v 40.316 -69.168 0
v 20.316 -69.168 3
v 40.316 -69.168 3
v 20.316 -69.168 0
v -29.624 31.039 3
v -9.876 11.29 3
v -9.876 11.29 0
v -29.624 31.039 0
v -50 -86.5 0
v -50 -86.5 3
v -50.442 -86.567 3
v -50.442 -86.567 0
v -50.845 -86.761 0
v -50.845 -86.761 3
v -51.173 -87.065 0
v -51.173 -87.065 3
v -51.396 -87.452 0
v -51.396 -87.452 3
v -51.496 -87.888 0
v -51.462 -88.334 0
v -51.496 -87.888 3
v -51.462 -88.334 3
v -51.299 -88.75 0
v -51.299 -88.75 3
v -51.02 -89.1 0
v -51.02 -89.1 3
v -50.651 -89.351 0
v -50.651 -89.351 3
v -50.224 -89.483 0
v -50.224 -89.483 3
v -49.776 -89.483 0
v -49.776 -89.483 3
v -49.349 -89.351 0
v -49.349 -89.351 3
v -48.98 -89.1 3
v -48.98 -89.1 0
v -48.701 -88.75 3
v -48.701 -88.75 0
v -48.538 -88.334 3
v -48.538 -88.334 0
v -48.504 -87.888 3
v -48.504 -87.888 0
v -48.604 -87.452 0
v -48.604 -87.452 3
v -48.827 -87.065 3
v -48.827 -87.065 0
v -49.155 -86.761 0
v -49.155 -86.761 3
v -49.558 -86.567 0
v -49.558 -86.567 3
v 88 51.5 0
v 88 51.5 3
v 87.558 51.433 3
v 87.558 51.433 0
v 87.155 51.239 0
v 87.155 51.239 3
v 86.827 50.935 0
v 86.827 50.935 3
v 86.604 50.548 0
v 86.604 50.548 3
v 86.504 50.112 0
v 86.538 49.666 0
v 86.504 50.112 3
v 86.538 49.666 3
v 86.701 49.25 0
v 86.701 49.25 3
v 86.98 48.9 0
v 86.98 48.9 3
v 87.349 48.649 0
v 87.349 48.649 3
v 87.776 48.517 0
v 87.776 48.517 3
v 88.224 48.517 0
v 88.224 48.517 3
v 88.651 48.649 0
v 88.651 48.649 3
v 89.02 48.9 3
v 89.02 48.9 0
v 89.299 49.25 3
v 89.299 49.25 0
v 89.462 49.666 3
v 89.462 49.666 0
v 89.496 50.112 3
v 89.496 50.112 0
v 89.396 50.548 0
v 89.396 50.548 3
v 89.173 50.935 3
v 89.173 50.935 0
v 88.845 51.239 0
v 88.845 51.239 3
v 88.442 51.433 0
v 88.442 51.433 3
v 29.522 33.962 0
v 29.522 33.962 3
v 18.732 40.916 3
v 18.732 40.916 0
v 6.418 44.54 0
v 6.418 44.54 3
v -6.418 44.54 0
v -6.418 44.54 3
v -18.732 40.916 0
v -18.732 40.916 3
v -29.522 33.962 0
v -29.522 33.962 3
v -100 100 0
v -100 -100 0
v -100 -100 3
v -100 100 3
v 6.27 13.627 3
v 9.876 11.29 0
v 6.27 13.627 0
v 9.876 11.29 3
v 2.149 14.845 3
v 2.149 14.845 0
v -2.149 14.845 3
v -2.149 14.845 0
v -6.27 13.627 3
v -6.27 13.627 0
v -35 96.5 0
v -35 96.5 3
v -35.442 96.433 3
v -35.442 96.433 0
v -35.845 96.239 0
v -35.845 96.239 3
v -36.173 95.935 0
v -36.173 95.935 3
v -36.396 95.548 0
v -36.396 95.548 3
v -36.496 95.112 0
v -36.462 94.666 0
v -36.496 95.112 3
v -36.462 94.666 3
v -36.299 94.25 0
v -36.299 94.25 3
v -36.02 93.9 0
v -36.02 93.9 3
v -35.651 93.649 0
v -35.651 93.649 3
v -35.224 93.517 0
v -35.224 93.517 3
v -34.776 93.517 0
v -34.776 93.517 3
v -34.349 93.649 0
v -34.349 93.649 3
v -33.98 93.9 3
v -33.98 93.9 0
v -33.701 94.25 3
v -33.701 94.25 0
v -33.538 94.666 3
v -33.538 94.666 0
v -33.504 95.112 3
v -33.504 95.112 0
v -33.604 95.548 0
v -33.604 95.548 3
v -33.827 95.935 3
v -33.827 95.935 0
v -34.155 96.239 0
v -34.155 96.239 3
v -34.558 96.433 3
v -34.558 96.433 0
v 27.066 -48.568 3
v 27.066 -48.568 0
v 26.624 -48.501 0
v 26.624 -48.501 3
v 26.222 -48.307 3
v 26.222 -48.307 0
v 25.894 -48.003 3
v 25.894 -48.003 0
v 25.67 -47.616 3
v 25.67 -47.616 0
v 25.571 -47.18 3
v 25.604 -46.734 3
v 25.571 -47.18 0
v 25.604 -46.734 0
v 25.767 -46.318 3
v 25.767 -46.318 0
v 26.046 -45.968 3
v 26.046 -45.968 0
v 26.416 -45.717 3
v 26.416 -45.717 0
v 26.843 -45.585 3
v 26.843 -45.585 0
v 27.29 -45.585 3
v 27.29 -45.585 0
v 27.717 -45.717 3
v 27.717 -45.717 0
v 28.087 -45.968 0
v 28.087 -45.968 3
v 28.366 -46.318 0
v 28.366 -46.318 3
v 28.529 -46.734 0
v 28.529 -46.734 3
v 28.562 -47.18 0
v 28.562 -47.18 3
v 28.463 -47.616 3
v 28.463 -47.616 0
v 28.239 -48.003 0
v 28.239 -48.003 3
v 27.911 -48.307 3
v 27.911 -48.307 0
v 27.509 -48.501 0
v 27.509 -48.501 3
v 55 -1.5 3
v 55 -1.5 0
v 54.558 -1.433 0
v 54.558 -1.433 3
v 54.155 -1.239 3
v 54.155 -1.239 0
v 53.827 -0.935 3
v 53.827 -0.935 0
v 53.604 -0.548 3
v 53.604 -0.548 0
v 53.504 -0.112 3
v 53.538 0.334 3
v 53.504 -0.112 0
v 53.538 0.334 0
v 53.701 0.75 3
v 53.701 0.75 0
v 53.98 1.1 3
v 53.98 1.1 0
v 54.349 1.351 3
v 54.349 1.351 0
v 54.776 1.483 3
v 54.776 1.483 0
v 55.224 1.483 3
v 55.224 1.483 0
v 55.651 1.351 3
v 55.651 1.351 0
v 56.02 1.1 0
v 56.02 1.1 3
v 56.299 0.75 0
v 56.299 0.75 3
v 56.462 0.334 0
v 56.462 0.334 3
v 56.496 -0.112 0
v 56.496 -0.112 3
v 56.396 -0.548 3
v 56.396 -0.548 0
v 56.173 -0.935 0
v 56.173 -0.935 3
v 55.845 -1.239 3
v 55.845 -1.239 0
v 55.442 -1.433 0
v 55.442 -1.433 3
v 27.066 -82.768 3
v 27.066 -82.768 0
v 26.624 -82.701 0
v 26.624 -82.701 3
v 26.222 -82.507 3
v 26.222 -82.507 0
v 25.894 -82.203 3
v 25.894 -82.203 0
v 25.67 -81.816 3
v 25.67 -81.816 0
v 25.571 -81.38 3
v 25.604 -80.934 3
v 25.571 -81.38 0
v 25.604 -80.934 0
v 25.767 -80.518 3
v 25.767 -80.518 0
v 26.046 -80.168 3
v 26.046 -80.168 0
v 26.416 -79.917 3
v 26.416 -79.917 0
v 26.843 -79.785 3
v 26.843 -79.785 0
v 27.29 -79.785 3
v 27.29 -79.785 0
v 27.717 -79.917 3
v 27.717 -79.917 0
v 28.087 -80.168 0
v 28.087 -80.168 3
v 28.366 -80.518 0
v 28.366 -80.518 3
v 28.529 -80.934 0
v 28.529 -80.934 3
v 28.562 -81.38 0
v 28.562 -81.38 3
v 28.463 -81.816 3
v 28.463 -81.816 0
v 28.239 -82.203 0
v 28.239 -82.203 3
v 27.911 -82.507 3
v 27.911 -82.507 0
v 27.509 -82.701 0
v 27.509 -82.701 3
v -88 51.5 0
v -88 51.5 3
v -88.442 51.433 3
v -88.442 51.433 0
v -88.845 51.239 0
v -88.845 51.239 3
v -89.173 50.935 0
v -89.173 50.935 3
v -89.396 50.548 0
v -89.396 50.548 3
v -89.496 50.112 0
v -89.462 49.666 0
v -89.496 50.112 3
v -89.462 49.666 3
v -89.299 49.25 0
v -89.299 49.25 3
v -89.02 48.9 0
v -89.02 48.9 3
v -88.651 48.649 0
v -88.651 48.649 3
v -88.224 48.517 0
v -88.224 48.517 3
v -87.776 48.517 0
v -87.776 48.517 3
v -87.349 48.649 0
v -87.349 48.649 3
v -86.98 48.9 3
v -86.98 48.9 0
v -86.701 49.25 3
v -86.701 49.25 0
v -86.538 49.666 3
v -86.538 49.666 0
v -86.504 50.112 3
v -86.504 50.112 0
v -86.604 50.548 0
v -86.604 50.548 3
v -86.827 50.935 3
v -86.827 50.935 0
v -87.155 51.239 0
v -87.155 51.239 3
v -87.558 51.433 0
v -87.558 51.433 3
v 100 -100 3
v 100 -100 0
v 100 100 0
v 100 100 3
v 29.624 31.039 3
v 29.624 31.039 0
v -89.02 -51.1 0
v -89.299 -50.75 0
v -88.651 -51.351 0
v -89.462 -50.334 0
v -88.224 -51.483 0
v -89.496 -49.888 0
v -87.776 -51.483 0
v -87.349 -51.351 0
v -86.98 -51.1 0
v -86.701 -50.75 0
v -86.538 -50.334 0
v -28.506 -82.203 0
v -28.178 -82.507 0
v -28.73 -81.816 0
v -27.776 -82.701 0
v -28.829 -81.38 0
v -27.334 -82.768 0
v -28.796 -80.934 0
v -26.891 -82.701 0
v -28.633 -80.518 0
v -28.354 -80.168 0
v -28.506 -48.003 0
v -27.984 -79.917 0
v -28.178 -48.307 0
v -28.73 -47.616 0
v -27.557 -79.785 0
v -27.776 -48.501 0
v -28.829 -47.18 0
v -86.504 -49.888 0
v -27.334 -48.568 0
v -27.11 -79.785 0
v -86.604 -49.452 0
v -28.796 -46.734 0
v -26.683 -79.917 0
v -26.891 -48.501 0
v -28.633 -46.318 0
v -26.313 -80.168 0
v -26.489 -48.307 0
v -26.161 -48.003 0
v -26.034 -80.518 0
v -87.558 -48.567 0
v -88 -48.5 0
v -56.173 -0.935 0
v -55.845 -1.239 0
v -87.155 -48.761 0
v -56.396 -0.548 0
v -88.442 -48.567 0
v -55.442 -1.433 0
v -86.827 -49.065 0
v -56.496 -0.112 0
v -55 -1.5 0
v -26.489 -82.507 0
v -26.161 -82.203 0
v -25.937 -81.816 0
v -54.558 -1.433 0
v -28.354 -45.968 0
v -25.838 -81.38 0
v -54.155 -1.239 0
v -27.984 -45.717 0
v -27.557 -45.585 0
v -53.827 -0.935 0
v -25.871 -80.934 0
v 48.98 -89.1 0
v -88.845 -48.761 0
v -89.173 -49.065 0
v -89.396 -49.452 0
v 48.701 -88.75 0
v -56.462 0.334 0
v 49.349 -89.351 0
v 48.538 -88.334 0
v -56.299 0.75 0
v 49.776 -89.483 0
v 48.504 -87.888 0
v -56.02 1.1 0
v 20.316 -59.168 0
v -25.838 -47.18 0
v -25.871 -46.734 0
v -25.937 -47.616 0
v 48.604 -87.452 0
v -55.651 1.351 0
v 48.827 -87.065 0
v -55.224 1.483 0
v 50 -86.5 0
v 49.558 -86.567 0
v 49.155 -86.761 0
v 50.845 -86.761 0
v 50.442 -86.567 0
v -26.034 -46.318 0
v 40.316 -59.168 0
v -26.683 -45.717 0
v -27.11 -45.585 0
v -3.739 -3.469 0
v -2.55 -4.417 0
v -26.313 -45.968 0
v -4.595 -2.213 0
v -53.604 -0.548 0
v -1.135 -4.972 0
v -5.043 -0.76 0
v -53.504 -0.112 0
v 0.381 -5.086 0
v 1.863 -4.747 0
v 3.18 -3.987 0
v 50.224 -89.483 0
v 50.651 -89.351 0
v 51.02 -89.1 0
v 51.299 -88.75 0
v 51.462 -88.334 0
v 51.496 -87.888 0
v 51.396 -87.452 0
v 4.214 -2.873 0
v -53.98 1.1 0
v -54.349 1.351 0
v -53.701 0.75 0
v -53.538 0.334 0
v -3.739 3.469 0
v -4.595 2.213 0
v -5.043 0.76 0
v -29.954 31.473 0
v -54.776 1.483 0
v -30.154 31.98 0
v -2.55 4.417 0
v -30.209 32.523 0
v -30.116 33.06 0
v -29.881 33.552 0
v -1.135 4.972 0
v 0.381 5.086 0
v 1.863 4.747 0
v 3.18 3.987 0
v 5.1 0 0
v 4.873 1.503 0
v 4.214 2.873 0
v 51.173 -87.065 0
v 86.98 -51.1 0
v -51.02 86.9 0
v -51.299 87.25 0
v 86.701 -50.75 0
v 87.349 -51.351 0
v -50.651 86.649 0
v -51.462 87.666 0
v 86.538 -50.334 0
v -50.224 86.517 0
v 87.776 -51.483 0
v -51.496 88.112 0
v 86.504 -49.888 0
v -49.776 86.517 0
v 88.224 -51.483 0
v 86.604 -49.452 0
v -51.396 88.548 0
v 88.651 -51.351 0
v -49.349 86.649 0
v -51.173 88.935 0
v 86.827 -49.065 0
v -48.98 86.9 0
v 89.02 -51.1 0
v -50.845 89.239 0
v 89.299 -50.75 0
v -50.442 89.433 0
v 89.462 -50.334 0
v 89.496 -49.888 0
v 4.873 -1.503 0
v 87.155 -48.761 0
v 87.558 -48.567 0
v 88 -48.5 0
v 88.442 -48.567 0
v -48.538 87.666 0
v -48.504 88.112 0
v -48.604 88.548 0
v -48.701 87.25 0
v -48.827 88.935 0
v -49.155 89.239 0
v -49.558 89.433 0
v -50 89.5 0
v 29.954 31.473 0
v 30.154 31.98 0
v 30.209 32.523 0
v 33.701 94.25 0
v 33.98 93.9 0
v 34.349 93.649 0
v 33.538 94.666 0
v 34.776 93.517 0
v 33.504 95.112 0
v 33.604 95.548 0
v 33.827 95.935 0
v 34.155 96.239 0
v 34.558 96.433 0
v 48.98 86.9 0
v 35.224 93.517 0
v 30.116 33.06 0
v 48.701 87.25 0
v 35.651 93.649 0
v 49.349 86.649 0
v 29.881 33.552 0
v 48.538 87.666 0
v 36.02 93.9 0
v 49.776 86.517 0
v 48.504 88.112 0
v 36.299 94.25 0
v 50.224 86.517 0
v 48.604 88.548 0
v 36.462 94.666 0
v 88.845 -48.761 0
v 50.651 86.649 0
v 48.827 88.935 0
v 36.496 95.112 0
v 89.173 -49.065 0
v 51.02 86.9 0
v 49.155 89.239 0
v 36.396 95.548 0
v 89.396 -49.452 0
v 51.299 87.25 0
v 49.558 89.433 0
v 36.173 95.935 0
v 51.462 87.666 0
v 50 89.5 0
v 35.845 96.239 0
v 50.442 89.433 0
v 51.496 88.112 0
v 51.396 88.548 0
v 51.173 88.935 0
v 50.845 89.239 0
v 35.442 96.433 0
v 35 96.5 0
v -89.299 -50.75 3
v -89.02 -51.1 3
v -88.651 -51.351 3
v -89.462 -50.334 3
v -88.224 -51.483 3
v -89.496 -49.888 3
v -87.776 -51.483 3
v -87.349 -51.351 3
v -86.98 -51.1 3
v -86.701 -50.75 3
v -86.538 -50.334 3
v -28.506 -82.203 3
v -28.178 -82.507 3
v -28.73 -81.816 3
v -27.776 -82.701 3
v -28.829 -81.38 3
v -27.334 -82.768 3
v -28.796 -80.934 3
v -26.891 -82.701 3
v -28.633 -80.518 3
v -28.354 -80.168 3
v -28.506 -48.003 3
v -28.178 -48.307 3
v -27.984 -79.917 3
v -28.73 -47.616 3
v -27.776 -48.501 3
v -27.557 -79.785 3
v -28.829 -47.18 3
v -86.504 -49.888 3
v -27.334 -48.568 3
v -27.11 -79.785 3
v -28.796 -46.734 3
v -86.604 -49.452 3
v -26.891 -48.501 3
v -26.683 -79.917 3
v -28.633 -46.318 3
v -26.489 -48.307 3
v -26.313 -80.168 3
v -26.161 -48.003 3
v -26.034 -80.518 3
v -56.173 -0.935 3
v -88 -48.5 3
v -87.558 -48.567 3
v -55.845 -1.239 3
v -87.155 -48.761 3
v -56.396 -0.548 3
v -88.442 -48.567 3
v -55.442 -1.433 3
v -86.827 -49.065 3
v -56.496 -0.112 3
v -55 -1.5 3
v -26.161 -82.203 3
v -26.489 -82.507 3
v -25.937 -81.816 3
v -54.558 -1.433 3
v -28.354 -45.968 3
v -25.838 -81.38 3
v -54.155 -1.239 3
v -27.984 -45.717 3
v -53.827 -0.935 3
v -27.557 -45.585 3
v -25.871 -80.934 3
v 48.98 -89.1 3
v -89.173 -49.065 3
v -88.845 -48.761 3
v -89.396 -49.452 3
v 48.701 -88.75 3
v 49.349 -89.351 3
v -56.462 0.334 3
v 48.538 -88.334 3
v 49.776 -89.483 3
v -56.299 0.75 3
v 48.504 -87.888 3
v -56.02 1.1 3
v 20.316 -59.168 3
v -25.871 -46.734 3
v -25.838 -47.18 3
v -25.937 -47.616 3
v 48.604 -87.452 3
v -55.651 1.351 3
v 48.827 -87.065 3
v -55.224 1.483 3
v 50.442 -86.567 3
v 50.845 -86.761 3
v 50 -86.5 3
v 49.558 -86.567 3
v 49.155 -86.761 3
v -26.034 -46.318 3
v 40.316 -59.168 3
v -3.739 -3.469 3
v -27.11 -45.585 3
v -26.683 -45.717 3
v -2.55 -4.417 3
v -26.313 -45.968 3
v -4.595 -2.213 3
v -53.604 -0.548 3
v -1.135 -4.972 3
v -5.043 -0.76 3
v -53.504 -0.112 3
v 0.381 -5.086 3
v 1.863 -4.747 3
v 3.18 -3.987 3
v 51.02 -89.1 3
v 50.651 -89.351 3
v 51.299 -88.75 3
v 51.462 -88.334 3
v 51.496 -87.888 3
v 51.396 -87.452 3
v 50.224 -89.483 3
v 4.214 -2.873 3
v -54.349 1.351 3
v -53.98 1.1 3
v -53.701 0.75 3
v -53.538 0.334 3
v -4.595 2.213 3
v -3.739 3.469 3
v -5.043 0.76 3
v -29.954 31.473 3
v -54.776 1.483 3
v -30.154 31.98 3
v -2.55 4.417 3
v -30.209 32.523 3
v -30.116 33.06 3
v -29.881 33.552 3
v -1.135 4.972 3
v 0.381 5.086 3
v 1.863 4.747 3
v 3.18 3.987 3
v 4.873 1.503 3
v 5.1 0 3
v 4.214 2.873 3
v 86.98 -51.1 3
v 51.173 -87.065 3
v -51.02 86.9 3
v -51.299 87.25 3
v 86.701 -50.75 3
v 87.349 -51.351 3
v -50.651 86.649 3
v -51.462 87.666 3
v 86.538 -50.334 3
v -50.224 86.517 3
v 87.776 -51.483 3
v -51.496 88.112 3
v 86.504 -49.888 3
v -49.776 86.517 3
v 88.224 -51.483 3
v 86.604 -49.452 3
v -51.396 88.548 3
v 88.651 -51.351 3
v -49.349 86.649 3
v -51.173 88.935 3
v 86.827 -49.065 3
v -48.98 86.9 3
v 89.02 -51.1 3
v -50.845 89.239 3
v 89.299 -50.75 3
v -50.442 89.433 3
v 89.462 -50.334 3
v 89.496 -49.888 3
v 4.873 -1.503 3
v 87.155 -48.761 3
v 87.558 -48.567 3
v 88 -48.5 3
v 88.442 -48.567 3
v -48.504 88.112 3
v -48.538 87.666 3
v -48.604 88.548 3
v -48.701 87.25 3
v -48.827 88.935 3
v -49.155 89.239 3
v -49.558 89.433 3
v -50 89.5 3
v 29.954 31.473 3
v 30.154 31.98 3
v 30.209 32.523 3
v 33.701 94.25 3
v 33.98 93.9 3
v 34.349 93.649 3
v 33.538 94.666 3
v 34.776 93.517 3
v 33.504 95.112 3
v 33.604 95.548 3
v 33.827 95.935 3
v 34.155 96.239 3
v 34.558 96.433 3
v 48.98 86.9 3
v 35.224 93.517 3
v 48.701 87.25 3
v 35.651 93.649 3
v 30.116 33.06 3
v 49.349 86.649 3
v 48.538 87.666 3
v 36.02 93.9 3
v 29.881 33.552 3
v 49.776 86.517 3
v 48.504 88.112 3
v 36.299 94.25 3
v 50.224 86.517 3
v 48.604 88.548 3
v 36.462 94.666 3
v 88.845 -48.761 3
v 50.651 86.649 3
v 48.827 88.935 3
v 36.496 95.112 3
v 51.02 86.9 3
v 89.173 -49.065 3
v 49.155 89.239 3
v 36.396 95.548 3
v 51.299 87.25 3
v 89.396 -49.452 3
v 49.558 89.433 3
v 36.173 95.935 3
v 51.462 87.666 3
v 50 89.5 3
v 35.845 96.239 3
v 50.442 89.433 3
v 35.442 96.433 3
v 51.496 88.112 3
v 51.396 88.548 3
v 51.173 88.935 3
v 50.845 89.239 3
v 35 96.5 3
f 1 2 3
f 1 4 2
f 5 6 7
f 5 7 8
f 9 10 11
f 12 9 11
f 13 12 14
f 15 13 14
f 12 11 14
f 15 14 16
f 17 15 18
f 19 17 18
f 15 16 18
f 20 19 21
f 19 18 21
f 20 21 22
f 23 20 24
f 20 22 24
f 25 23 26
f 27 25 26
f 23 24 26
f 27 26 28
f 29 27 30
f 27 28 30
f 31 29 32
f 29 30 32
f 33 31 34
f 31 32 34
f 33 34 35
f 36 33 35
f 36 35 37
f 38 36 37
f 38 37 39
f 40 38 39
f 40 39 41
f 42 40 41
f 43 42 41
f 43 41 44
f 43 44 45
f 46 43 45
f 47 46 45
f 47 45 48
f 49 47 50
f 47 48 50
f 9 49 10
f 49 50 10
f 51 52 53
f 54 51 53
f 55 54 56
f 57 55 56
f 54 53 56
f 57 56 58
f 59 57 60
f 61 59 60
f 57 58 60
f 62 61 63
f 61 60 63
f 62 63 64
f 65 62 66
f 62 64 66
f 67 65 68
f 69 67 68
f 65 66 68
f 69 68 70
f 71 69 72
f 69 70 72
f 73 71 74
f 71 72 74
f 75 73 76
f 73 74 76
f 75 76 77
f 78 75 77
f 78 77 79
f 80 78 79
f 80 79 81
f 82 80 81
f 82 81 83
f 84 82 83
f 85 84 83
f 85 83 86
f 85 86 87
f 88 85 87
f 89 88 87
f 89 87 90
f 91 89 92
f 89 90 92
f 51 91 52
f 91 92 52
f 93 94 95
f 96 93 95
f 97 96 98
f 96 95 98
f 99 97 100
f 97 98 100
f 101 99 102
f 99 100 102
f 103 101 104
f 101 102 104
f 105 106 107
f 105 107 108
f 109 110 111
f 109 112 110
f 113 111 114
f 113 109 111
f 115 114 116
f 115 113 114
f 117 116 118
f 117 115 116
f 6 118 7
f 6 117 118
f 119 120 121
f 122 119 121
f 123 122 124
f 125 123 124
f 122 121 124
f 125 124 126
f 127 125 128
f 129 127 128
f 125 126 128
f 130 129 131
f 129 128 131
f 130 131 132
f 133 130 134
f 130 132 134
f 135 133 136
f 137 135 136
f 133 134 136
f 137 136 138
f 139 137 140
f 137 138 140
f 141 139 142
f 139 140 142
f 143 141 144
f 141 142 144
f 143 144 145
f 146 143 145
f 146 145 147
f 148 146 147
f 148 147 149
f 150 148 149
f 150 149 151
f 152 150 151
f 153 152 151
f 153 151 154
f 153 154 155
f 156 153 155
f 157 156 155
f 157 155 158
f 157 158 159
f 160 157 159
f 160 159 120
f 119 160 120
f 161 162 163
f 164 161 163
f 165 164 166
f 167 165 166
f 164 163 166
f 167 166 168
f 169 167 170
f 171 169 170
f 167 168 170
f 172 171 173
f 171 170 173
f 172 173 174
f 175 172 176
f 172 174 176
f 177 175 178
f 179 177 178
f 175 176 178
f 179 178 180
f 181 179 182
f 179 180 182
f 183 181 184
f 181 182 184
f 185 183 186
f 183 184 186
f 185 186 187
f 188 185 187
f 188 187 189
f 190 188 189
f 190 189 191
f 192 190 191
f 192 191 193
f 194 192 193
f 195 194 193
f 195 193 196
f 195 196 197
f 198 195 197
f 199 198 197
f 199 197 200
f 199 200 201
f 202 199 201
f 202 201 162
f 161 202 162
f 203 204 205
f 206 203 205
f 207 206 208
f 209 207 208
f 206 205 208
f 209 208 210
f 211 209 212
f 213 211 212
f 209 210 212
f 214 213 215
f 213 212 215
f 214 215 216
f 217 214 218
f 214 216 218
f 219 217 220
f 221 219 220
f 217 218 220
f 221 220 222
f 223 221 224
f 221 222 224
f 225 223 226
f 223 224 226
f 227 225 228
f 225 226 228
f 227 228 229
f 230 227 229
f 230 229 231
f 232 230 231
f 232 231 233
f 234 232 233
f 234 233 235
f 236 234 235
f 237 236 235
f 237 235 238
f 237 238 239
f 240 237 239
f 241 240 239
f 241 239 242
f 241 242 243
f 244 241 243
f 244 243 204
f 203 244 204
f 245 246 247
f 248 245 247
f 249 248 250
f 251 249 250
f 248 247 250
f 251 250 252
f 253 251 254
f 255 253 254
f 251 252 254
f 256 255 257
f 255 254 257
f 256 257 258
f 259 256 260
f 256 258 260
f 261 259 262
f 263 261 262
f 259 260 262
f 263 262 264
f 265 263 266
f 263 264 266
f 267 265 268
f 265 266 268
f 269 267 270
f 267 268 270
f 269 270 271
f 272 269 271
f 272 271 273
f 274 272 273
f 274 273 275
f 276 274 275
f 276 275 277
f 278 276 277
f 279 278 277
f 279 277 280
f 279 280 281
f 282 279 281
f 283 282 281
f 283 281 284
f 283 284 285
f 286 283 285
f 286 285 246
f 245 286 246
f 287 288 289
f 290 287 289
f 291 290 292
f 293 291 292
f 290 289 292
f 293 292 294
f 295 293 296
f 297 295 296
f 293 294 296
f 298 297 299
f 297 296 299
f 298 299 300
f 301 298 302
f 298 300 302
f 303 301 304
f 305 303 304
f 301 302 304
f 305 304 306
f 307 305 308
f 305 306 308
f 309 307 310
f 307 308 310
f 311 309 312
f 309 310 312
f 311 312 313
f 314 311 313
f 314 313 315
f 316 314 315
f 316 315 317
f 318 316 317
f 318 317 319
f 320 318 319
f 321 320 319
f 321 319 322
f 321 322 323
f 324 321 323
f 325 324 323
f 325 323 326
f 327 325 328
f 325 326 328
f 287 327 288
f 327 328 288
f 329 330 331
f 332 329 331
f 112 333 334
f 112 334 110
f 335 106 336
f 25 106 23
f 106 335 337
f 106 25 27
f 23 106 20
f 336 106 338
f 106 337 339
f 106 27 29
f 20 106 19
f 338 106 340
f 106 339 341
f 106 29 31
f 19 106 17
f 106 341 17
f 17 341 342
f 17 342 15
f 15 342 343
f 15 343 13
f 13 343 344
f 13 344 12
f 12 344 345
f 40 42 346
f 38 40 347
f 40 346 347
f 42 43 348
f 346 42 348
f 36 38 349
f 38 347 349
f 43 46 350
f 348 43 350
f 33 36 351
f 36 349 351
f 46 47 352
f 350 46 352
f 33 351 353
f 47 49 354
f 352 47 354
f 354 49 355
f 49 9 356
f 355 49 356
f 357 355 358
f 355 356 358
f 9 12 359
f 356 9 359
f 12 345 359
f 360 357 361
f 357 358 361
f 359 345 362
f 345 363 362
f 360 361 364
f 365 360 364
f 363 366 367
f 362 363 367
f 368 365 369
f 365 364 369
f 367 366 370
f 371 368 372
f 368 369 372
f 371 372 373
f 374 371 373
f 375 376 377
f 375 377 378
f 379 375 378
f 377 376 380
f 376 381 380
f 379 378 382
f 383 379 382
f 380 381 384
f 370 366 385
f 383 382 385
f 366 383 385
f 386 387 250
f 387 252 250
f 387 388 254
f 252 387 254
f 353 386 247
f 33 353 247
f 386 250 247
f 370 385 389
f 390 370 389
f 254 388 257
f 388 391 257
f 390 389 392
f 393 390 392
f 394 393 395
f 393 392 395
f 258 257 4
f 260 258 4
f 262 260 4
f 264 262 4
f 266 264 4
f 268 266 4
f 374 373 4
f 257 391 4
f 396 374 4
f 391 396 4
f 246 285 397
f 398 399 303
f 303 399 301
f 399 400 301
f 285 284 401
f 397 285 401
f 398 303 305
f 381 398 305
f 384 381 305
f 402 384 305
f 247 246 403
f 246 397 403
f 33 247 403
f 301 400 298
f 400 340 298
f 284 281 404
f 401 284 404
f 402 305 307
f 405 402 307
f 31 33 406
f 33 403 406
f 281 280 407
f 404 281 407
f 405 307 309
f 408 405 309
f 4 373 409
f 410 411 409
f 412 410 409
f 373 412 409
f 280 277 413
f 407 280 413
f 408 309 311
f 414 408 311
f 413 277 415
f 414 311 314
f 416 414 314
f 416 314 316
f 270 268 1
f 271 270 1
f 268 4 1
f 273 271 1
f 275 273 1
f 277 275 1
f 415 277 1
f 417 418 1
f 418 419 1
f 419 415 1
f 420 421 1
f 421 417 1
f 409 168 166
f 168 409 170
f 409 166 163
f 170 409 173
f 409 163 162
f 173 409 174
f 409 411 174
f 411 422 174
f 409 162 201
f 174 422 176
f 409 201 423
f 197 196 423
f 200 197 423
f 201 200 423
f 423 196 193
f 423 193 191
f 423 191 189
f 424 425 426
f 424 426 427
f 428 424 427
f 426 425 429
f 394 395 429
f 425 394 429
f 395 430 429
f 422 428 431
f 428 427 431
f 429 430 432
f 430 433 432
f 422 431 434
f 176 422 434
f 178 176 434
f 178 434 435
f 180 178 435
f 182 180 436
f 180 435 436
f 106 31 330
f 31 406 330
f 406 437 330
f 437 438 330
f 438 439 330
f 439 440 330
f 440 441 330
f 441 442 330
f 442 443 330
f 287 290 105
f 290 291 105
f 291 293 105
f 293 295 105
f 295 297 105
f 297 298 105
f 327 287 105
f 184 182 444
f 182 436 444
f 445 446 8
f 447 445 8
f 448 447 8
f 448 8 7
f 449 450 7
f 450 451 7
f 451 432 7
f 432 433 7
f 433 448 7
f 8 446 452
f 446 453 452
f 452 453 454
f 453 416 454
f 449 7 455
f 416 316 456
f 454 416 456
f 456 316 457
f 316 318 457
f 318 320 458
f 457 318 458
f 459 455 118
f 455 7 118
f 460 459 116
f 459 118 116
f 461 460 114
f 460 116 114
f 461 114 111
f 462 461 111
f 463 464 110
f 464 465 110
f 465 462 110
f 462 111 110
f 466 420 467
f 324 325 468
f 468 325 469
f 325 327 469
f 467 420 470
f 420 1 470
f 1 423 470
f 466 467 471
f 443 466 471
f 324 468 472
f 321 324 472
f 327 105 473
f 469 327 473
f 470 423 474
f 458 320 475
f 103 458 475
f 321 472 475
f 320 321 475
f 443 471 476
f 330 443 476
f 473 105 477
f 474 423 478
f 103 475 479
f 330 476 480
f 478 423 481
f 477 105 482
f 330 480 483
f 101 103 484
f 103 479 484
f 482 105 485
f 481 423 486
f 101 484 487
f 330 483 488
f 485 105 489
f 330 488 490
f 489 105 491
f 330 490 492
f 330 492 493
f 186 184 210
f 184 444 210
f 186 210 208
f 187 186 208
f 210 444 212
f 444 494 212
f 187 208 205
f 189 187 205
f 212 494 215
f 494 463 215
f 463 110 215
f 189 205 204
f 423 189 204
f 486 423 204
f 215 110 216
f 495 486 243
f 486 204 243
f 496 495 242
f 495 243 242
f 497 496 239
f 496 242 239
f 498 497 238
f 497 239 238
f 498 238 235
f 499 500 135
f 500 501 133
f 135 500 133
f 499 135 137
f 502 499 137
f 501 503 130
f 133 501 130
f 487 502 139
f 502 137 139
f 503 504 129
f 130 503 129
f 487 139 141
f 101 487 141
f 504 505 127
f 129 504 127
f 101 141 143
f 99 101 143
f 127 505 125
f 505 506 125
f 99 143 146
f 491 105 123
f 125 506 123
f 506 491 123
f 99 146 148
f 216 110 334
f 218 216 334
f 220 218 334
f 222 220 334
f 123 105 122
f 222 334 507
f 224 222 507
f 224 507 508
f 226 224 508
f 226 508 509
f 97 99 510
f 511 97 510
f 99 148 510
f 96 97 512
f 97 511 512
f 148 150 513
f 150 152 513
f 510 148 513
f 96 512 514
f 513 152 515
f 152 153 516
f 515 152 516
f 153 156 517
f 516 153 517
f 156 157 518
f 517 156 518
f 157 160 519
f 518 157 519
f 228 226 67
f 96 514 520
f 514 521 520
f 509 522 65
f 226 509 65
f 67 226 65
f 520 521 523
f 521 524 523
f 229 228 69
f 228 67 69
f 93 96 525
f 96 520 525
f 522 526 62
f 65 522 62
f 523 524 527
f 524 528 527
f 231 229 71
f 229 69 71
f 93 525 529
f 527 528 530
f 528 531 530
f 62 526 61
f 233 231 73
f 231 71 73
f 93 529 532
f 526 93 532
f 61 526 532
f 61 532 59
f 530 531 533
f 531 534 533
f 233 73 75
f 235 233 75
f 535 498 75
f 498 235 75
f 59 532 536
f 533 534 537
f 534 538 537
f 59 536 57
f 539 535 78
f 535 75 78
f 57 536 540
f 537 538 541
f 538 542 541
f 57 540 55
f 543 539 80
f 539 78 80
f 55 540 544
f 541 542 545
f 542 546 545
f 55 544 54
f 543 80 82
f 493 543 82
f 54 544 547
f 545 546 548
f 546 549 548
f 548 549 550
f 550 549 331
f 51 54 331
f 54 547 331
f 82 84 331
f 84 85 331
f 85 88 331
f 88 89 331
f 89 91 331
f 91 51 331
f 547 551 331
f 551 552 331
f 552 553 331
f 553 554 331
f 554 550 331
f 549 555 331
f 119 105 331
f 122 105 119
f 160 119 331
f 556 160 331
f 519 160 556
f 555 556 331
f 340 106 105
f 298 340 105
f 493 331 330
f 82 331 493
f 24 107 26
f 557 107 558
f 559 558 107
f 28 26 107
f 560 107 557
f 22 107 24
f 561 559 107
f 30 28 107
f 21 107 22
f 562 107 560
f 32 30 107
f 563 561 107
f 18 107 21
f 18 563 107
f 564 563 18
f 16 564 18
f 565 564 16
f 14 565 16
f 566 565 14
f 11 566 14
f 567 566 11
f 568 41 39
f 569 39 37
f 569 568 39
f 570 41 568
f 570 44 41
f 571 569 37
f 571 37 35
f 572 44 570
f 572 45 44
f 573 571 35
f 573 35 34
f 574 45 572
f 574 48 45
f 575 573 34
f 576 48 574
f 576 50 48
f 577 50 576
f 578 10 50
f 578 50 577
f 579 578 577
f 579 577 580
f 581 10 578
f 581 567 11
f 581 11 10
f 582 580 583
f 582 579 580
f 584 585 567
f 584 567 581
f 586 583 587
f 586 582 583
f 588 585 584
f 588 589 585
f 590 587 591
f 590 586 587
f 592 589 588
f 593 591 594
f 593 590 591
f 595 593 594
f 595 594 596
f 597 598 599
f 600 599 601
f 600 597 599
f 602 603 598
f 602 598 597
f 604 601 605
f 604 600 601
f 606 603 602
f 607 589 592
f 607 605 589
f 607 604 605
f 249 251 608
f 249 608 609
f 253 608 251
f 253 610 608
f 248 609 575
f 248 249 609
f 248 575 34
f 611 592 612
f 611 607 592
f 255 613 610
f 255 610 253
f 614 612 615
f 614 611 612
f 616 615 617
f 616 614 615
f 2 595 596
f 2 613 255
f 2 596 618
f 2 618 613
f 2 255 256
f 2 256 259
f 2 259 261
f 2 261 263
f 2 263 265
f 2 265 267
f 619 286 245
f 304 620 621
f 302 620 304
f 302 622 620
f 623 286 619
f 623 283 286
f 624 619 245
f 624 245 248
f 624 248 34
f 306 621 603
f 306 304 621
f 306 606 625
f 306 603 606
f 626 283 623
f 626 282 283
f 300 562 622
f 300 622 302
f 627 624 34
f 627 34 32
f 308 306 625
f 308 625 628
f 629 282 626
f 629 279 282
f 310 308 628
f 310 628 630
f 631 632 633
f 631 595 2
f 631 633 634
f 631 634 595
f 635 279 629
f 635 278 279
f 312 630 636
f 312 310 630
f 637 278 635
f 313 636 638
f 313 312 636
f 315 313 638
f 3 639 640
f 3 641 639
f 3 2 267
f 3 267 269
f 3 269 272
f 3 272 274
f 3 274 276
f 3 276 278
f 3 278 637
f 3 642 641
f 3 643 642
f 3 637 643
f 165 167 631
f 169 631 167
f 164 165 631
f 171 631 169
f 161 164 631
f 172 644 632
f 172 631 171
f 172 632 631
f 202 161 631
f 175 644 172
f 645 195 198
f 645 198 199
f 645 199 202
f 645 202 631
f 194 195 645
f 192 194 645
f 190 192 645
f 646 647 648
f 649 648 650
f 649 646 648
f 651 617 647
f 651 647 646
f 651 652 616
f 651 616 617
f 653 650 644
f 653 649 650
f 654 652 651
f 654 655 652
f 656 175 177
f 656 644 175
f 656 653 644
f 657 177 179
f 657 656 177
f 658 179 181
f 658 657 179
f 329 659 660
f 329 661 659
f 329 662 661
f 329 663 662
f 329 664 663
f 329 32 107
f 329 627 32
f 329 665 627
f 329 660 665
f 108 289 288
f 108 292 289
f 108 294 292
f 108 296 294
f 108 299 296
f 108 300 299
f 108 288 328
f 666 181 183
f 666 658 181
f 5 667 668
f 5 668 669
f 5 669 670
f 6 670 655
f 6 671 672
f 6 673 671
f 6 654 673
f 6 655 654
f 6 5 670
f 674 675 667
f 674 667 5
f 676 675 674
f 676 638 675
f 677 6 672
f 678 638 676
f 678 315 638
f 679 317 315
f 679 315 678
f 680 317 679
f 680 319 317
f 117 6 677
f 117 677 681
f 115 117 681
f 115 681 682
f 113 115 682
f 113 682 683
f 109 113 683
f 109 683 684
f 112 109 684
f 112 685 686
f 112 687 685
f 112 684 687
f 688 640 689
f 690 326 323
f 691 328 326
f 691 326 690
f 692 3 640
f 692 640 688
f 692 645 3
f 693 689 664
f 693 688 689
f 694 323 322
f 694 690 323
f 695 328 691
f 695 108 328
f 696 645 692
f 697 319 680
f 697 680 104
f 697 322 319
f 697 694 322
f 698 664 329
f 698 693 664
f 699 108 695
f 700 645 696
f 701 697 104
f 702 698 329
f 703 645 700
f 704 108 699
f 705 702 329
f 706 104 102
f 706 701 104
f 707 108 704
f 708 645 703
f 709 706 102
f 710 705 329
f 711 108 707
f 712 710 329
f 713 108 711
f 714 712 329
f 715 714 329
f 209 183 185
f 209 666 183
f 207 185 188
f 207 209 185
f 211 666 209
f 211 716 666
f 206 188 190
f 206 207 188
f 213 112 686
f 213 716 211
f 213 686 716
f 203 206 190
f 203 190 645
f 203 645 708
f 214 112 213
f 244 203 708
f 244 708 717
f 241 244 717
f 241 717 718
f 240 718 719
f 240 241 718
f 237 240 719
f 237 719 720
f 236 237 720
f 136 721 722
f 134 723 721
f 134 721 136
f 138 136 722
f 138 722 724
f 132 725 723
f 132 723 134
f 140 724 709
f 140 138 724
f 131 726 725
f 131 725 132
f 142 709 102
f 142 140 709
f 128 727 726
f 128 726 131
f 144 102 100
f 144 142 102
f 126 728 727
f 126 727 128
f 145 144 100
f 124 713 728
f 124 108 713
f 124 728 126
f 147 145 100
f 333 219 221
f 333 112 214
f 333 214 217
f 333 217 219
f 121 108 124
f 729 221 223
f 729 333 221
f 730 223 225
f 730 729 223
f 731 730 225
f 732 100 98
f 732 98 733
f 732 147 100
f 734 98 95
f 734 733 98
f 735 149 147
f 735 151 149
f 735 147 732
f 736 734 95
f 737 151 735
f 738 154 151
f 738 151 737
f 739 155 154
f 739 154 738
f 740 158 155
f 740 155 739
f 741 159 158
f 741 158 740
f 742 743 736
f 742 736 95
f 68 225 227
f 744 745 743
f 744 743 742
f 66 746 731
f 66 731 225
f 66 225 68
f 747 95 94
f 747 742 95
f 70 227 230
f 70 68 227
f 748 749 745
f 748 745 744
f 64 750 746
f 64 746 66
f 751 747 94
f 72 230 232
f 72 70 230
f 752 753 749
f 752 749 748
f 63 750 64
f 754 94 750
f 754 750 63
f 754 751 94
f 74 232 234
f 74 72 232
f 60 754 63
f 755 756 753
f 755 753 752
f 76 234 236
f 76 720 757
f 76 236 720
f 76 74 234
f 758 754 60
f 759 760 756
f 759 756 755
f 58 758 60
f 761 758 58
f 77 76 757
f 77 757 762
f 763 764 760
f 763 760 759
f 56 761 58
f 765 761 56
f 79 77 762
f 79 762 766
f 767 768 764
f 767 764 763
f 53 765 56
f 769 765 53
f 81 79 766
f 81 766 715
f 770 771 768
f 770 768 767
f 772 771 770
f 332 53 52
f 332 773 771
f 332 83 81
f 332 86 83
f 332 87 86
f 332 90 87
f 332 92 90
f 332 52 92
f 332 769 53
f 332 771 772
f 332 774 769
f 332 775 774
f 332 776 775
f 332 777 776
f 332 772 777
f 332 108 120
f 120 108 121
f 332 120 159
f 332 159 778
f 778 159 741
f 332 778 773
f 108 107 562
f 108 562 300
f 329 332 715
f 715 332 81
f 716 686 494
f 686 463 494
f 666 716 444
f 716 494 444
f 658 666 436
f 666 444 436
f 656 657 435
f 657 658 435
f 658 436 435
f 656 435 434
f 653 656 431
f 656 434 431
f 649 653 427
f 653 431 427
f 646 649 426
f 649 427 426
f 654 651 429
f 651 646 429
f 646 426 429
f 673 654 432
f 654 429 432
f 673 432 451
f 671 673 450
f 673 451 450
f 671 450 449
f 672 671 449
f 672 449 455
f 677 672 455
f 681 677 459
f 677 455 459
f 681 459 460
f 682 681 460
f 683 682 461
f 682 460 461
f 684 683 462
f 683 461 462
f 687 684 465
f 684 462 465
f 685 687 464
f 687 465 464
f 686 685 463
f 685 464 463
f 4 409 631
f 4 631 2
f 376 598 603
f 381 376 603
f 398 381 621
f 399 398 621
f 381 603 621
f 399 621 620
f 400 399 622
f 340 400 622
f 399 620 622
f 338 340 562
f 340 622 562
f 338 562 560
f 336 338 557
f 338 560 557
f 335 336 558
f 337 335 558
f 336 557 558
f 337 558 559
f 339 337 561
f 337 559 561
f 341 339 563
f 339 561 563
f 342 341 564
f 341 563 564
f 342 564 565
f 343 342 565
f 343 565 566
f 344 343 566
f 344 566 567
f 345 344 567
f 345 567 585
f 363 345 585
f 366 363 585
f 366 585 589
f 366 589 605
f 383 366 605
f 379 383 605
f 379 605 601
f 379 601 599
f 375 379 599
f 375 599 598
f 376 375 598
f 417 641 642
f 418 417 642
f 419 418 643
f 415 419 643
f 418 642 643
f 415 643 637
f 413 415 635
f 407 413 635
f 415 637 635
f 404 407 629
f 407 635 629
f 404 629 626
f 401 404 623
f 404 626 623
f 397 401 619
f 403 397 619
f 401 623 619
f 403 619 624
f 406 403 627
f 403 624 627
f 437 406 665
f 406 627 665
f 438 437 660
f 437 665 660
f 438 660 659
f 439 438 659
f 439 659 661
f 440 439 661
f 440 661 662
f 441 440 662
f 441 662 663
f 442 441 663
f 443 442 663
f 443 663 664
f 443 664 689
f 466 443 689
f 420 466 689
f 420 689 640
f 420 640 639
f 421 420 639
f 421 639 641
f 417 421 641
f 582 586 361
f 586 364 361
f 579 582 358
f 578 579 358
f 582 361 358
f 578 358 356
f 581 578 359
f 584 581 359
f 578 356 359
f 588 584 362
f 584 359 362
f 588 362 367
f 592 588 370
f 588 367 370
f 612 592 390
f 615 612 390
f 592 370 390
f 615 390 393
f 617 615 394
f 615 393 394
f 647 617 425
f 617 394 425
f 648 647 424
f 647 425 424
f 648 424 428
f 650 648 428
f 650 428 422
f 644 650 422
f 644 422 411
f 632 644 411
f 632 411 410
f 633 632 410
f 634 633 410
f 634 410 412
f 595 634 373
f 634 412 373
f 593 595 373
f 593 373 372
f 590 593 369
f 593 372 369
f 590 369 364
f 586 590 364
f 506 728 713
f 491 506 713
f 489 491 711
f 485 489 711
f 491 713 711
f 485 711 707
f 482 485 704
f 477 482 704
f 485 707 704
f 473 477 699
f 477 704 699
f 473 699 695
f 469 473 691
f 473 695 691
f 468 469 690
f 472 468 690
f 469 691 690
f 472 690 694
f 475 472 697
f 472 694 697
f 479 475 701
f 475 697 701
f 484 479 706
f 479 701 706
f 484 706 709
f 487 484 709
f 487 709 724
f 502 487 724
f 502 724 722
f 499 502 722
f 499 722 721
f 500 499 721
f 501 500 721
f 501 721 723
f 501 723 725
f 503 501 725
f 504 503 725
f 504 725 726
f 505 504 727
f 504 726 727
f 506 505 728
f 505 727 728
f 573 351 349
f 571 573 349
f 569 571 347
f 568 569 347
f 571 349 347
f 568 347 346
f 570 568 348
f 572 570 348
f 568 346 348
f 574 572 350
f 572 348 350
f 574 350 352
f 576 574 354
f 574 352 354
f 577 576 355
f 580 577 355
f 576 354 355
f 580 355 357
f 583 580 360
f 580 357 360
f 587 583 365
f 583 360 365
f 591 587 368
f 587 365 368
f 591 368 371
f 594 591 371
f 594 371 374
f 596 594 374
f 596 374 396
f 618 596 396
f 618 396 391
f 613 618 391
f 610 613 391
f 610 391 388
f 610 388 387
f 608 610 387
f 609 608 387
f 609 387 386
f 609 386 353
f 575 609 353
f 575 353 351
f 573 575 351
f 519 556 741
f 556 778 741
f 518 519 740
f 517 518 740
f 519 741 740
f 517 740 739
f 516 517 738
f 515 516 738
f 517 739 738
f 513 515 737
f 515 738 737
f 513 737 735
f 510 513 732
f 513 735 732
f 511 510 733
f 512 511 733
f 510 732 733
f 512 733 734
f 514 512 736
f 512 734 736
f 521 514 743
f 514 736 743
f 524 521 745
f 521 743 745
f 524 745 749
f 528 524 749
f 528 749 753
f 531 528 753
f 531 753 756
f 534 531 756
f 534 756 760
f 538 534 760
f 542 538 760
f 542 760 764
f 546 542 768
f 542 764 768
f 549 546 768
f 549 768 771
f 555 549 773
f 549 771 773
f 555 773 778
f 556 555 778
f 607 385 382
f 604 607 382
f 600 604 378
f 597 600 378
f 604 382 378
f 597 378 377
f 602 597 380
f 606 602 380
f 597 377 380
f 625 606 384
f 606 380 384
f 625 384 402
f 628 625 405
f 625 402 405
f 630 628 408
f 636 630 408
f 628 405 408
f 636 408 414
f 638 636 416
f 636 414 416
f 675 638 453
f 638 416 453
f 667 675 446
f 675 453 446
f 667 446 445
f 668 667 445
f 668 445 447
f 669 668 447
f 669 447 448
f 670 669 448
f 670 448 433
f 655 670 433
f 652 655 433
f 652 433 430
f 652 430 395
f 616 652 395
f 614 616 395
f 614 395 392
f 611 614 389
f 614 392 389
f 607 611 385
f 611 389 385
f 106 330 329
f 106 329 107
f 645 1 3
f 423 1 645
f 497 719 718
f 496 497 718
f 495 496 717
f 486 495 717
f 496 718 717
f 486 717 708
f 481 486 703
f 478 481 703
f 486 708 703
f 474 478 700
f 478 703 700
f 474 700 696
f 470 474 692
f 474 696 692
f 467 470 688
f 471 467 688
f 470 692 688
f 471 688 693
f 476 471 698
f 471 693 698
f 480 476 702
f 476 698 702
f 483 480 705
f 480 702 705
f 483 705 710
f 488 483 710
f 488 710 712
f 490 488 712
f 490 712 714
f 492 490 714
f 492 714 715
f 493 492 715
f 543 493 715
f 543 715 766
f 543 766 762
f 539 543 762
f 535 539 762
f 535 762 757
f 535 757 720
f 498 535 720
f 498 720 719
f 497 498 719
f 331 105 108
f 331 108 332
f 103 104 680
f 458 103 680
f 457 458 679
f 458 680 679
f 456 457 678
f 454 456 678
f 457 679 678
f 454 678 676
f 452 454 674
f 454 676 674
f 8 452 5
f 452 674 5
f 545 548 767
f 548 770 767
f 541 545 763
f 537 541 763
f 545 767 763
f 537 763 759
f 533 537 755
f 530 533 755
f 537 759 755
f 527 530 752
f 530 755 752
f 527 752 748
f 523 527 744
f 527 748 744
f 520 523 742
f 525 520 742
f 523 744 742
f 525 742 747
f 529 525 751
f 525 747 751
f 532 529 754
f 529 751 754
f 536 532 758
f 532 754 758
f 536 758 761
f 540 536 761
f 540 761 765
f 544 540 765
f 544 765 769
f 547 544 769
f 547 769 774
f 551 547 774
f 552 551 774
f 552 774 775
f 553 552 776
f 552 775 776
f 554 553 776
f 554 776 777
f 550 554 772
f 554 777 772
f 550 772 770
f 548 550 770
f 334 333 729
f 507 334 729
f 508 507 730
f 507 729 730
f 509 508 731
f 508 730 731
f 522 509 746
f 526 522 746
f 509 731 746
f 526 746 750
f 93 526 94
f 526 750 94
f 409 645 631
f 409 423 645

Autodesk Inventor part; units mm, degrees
ref_plane "YZ Plane" through (0, 0, 0) normal (1, 0, 0) x (0, 1, 0)
ref_plane "XZ Plane" through (0, 0, 0) normal (0, 1, 0) x (-1, 0, 0)
ref_plane "XY Plane" through (0, 0, 0) normal (0, 0, 1) x (1, 0, 0)
sketch "Boceto1" plane through (0, 0, 0) normal (0, 0, 1) x (1, 0, 0)
  line L0 (-103, 100) -> (-103, -103)
  line L1 (-103, 100) -> (-100, 100)
  line L2 (-100, -103) -> (-100, 100)
  line L3 (-103, -103) -> (-100, -103)
  line L4 (100, 103) -> (-103, 103)
  line L5 (100, 103) -> (100, 100)
  line L6 (-103, 100) -> (100, 100)
  line L7 (-103, 103) -> (-103, 100)
  line L8 (-100, -103) -> (103, -103)
  line L9 (-100, -103) -> (-100, -100)
  line L10 (103, -100) -> (-100, -100)
  line L11 (103, -103) -> (103, -100)
  line L12 (100, -98) -> (100, 100)
  line L13 (100, 100) -> (98, 100)
  circle A0 centre (0, 0) radius 3.9
  circle A1 centre (0, 0) radius 8
  circle A2 centre (0, 0) radius 3.9
  circle A3 centre (0, 0) radius 4
  line L14 (103, 100) -> (103, -103)
  line L15 (100, -103) -> (100, 100)
  line L16 (103, -103) -> (100, -103)
  circle A4 centre (0, 0) radius 5.1
  line L17 (103, 100) -> (100, 100)
  point P0 (100, -100)
extrude "Extrusión1" add sketch "Boceto1" along normal blind 3 contours L6 L12 L15 L10 L2 | A1
sketch "Boceto2" plane through (0, 0, 3) normal (0, 0, 1) x (1, 0, 0)
  circle A0 centre (0, 0) radius 45
  line L0 (-4.4142, 5.8284) -> (-29.6244, 31.0386)
  arc A1 (-3.1395, 44.8903) -> (-29.5223, 33.9623) centre (0, 0) ccw
  line L1 (29.6244, 31.0386) -> (4.4142, 5.8284)
  arc A2 (29.5223, 33.9623) -> (3.1395, 44.8903) centre (0, 0) ccw
  arc A3 (-29.5223, 33.9623) -> (-29.6244, 31.0386) centre (-28.2102, 32.4528) ccw
  arc A4 (29.6244, 31.0386) -> (29.5223, 33.9623) centre (28.2102, 32.4528) ccw
  circle A5 centre (0, 0) radius 8
  circle A6 centre (0, 0) radius 8
  arc A7 (10.4625, 10.7488) -> (-10.4625, 10.7488) centre (0, 0) ccw projected
  point P0 (36.7643, -25.9497)
  point P1 (-36.7643, -25.9497)
  point P2 (-4.9054, 6.3196)
  point P3 (4.9054, 6.3196)
  point P4 (-9.8759, 11.2901)
  point P5 (9.8759, 11.2901)
extrude "Extrusión2" cut sketch "Boceto2" against normal blind 3 contours A4 L1 A7 L0 A3 A0
sketch "Boceto4" plane through (0, 0, 3) normal (0, 0, 1) x (1, 0, 0)
  circle A0 centre (0, 0) radius 55
  circle A1 centre (0, 0) radius 5.1 projected
  line L0 (0, 0) -> (55, 0)
  circle A2 centre (55, 0) radius 1.5
  circle A3 centre (-55, 0) radius 1.5
  dimension "d14" = 55
  dimension "d15" = 3
  dimension "d16" = 3
hole "Agujero2" at (55, 0, 3) at (-55, 0, 3) direction (0, 0, -1) diameter 3 depth 4
sketch "Boceto5" plane through (0, 0, 0) normal (0, 0, -1) x (-1, 0, 0)
  circle A0 centre (88, -50) radius 2.1 projected
  circle A1 centre (50, -88) radius 2.1 projected
  circle A2 centre (-50, -88) radius 2.1 projected
  circle A3 centre (-88, -50) radius 2.1 projected
  circle A4 centre (-88, 50) radius 2.1 projected
  circle A5 centre (-50, 88) radius 2.1 projected
  circle A6 centre (50, 88) radius 2.1 projected
  circle A7 centre (88, 50) radius 2.1 projected
  point P0 (0, 0)
hole "Agujero3" at (-88, -50, 0) at (-88, 50, 0) at (-50, 88, 0) at (50, 88, 0) at (88, 50, 0) at (88, -50, 0) at (50, -88, 0) at (-50, -88, 0) direction (0, 0, 1) diameter 3 depth 4
sketch "Boceto6" plane through (0, 0, 3) normal (0, 0, 1) x (1, 0, 0)
  line L0 (20.3165, -69.168) -> (31.0665, -69.168) projected
  line L1 (20.3165, -74.518) -> (20.3165, -69.168) projected
  line L2 (-20.5835, -74.518) -> (20.3165, -74.518) projected
  line L3 (-20.5835, -53.818) -> (-20.5835, -74.518) projected
  line L4 (20.3165, -53.818) -> (-20.5835, -53.818) projected
  line L5 (20.3165, -59.168) -> (20.3165, -53.818) projected
  line L6 (31.0665, -59.168) -> (20.3165, -59.168) projected
  line L7 (31.0665, -43.068) -> (31.0665, -59.168) projected
  line L8 (23.0665, -43.068) -> (31.0665, -43.068) projected
  line L9 (-15.3335, -51.068) -> (15.0665, -51.068) projected
  line L10 (-31.3335, -43.068) -> (-23.3335, -43.068) projected
  line L11 (-31.3335, -85.268) -> (-31.3335, -43.068) projected
  line L12 (-23.3335, -85.268) -> (-31.3335, -85.268) projected
  line L13 (15.0665, -77.268) -> (-15.3335, -77.268) projected
  line L14 (31.0665, -85.268) -> (23.0665, -85.268) projected
  line L15 (31.0665, -69.168) -> (31.0665, -85.268) projected
  circle A0 centre (27.0665, -81.268) radius 2.1 projected
  circle A1 centre (-27.3335, -81.268) radius 2.1 projected
  circle A2 centre (27.0665, -47.068) radius 2.1 projected
  circle A3 centre (-27.3335, -47.068) radius 2.1 projected
  arc A4 (15.0665, -51.068) -> (23.0665, -43.068) centre (15.0665, -43.068) ccw projected
  arc A5 (-23.3335, -43.068) -> (-15.3335, -51.068) centre (-15.3335, -43.068) ccw projected
  arc A6 (-15.3335, -77.268) -> (-23.3335, -85.268) centre (-15.3335, -85.268) ccw projected
  arc A7 (23.0665, -85.268) -> (15.0665, -77.268) centre (15.0665, -85.268) ccw projected
  point P0 (0, 0)
hole "Agujero4" at (27.0665, -81.268, 3) at (27.0665, -47.068, 3) at (-27.3335, -47.068, 3) at (-27.3335, -81.268, 3) direction (0, 0, -1) diameter 3 depth 15
sketch "Boceto7" plane through (0, 0, 0) normal (0, 0, -1) x (-1, 0, 0)
  circle A0 centre (35, 95) radius 2.1 projected
  circle A1 centre (-35, 95) radius 2.1 projected
  circle A2 centre (35, 95) radius 1.5
  point P0 (0, 0)
  dimension "d38" = 3
hole "Agujero5" at (-35, 95, 0) at (35, 95, 0) direction (0, 0, 1) diameter 3 depth 15
sketch "Boceto8" plane through (0, 0, 0) normal (0, 0, -1) x (-1, 0, 0)
  arc A0 (-15.0665, -77.268) -> (-23.0665, -85.268) centre (-15.0665, -85.268) ccw projected
  line L0 (-31.0665, -85.268) -> (-23.0665, -85.268) projected
  line L1 (-31.0665, -69.168) -> (-31.0665, -85.268) projected
  line L2 (-31.0665, -43.068) -> (-31.0665, -59.168) projected
  line L3 (-31.0665, -59.168) -> (-20.3165, -59.168) projected
  line L4 (-20.3165, -69.168) -> (-31.0665, -69.168) projected
  line L5 (-20.0665, -54.068) -> (-20.0665, -74.268) projected
  line L6 (-23.0665, -43.068) -> (-31.0665, -43.068) projected
  line L7 (-20.3165, -69.168) -> (-40.3165, -69.168)
  line L8 (-40.3165, -69.168) -> (-40.3165, -59.168)
  line L9 (-40.3165, -59.168) -> (-20.3165, -59.168)
  line L10 (-20.3165, -59.168) -> (-20.3165, -69.168)
  point P0 (0, 0)
  dimension "d46" = 20
  dimension "d47" = 10
extrude "Extrusión3" cut sketch "Boceto8" against normal blind 10
properties part number "Soporte_Dosificador"
